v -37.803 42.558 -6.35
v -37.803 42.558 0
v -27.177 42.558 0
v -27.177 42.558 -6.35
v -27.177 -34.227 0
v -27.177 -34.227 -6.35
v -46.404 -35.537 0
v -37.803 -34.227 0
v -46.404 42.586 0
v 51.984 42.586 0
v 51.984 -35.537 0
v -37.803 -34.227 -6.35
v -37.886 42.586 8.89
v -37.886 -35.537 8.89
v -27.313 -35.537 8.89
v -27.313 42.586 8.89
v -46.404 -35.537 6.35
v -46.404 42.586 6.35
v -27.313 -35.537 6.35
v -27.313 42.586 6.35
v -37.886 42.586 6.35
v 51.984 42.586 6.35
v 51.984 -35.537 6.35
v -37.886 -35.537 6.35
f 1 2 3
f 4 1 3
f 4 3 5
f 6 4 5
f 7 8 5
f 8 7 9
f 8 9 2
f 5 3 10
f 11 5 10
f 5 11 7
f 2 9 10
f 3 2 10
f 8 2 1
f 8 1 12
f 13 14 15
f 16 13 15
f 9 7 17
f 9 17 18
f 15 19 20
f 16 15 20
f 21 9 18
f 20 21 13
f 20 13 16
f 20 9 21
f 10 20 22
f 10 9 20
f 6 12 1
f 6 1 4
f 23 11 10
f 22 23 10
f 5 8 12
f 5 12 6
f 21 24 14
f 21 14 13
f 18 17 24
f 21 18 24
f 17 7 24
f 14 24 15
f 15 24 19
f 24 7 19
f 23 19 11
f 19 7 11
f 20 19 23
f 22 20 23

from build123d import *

# Parameters (mm, degrees)
F0_W       = 98.3872264624
F0_H       = 78.1223997474
F1_DEPTH   = 2.54
F2_W       = 10.5729550123
F2_H       = 78.1223997474
F1_FACE1_W = 98.3872264624
F1_FACE1_H = 78.1223997474
F3_DEPTH   = 6.35
F5_W       = 10.6261968613
F5_H       = 76.7848268151
F6_DEPTH   = 6.35


with BuildPart() as f1:
    # F0 (on Top) → F1 (new body)
    with BuildSketch(Plane.XY):
        with Locations((2.7900859714, 3.524325788)):
            Rectangle(F0_W, F0_H)
    extrude(amount=F1_DEPTH)

    # F2 (on face) + F1_face1 (on face) → F3 (join)
    with BuildSketch(Plane.XY.offset(2.54)):
        with Locations((-32.5999483466, 3.524325788)):
            Rectangle(F2_W, F2_H)
    with BuildSketch(Plane(origin=(2.7900859714, 3.524325788, 0), x_dir=(1, 0, 0), z_dir=(0, 0, -1))):
        Rectangle(F1_FACE1_W, F1_FACE1_H)
    extrude(amount=F3_DEPTH, dir=(0, 0, 1))

    # F5 (on face) → F6 (join)
    with BuildSketch(Plane(origin=(0, 0, 0), x_dir=(1, 0, 0), z_dir=(0, 0, -1))):
        with Locations((-32.4897877872, -4.1658058763)):
            Rectangle(F5_W, F5_H)
    extrude(amount=F6_DEPTH)


solid = f1.part
